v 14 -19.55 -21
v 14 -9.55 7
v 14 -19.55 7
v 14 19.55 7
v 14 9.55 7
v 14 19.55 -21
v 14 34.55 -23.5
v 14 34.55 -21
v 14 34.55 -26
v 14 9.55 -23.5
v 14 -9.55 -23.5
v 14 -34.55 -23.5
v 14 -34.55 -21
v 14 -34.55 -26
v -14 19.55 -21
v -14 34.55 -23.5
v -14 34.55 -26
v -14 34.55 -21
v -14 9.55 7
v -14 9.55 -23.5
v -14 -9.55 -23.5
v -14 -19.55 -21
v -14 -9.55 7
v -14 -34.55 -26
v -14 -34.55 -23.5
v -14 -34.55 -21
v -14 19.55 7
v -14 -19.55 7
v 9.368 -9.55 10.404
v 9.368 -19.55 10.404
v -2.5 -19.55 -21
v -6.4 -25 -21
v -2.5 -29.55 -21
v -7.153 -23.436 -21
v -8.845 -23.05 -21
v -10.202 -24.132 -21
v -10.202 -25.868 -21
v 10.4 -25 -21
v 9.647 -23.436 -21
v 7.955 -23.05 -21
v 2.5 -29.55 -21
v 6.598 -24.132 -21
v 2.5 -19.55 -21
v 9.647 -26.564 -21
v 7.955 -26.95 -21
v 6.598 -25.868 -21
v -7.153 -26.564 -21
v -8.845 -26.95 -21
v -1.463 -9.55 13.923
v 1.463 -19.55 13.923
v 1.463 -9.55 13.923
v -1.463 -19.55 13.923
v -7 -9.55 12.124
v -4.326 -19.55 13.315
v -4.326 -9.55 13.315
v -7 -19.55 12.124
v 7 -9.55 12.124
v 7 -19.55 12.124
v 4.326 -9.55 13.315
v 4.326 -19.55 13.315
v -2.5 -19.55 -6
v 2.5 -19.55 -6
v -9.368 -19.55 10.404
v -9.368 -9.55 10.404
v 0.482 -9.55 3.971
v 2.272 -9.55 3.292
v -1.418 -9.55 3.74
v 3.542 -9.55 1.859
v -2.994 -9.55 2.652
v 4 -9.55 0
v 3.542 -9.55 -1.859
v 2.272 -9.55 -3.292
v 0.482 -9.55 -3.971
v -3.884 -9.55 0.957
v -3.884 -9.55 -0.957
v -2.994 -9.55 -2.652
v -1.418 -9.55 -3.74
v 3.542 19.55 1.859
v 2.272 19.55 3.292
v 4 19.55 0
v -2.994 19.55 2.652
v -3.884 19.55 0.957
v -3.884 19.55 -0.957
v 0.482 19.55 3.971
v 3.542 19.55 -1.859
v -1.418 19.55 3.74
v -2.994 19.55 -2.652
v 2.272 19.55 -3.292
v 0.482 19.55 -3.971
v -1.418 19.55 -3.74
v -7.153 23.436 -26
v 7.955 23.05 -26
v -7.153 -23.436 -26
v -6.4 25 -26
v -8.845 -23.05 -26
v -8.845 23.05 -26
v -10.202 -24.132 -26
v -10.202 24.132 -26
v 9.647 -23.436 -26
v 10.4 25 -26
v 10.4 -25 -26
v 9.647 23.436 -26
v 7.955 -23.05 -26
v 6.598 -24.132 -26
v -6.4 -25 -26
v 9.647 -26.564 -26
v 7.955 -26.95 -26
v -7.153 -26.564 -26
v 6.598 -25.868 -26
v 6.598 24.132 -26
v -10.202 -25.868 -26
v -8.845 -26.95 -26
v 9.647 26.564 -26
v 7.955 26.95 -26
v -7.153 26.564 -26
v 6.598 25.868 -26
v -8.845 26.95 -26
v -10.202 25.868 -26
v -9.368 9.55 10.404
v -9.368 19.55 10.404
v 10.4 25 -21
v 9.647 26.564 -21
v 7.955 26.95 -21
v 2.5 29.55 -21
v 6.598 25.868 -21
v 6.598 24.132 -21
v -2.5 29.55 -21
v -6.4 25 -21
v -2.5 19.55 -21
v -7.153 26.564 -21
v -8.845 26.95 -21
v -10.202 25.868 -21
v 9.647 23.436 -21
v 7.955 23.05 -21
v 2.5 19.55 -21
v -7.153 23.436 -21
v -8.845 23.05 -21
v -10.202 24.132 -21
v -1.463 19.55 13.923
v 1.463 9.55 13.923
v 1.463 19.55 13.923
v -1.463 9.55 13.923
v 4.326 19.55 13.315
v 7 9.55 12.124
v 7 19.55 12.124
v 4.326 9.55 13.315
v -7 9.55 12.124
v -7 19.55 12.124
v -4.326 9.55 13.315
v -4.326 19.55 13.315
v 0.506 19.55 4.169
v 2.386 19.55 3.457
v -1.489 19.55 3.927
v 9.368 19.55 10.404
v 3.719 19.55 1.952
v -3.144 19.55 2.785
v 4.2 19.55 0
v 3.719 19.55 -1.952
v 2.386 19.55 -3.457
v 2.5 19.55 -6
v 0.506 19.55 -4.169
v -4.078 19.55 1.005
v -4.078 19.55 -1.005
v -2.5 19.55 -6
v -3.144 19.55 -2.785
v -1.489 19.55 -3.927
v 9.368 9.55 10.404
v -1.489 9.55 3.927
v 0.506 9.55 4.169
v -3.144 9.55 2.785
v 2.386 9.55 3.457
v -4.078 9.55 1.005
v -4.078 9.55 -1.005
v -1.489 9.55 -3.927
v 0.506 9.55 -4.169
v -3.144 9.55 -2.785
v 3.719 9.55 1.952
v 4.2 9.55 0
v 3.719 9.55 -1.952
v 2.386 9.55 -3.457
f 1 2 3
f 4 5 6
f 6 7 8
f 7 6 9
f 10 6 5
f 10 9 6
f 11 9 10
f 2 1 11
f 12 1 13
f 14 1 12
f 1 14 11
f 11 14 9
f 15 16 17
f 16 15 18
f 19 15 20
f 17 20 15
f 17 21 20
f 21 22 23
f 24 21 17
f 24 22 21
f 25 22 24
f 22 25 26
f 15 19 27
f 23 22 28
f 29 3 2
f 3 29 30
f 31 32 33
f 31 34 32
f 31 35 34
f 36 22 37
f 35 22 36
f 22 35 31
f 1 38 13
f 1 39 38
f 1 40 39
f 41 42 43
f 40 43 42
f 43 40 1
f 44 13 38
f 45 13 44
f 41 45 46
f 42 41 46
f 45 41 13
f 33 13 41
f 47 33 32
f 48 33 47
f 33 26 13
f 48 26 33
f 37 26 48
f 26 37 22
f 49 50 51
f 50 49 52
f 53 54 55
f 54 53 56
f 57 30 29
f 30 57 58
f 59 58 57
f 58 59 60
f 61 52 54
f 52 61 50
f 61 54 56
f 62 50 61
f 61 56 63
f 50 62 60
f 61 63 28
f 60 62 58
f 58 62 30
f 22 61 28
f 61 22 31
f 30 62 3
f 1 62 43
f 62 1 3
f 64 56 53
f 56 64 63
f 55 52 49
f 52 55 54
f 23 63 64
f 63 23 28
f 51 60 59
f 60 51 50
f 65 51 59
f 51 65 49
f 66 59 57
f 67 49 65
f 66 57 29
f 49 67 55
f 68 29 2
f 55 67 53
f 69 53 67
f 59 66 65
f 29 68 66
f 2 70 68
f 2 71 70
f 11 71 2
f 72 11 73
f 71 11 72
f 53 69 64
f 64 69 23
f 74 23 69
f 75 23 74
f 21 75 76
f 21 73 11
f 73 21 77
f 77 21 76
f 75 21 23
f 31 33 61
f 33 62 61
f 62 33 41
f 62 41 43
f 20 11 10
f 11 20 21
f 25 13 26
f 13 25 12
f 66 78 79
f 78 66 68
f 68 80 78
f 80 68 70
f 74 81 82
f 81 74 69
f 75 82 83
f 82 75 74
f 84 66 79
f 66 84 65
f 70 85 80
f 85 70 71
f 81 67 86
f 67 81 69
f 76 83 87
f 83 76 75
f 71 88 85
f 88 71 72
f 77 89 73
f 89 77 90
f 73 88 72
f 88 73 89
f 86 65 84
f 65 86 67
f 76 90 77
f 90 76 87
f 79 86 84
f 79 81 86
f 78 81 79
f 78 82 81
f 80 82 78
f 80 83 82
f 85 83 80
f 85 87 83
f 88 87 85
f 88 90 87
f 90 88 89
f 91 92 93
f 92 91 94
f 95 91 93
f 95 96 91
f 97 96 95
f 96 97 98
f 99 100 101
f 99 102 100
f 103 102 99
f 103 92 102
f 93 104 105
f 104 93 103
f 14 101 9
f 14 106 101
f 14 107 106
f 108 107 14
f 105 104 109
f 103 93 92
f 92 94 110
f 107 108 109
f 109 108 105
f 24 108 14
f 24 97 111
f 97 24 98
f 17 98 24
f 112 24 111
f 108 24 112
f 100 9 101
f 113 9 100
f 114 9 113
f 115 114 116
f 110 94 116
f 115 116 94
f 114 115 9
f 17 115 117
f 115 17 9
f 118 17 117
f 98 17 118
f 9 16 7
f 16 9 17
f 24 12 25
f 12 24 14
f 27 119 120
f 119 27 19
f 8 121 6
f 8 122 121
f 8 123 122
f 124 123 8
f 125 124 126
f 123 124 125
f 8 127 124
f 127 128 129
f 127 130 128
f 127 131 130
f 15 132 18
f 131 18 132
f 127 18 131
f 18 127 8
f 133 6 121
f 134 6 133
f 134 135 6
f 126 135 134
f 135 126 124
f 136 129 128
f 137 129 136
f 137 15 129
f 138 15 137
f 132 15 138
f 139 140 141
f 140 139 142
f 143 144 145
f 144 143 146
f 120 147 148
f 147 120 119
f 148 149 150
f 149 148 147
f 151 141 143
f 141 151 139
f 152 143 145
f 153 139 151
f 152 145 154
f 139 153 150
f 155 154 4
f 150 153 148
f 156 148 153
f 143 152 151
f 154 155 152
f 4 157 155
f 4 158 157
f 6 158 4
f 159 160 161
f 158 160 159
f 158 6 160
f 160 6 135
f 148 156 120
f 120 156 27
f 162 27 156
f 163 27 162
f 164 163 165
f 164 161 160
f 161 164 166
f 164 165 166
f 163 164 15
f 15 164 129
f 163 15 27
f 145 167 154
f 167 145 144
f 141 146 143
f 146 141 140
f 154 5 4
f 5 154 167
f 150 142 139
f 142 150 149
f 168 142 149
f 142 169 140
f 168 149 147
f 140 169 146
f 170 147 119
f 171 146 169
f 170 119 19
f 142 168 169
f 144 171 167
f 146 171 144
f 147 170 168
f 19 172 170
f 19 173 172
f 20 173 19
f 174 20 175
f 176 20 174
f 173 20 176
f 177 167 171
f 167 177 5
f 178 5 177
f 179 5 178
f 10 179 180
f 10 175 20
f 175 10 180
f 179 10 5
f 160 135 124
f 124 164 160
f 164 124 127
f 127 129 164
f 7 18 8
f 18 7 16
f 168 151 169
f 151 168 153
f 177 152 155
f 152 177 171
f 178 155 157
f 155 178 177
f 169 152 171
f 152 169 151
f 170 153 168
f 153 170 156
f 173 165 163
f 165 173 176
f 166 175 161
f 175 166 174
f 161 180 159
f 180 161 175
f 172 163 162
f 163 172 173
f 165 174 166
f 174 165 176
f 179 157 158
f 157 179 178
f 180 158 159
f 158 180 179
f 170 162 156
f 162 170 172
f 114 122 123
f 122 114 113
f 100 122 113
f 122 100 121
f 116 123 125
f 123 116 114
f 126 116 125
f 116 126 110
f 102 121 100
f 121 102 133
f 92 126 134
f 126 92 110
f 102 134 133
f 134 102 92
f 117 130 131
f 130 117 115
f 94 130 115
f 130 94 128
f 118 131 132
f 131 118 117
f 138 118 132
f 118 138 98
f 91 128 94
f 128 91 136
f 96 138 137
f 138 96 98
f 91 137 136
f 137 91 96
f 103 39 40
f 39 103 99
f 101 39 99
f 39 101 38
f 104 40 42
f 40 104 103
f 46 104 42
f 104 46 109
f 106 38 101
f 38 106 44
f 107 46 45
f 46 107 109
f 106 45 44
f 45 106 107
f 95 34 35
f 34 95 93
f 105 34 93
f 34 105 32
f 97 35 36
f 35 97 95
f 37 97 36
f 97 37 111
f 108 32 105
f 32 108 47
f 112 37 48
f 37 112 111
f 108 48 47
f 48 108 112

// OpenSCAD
// file: tensioner_bearing_idler.scad
bearing_r = 11.1;
retainer_h = bearing_r + 6;
wall_thickness = 2;
idler_h = 15;

module idler(){
	difference(){
		union(){
			translate([0,0,idler_h - wall_thickness]) cylinder(h=wall_thickness, r = retainer_h);
			cylinder(h=idler_h, r = bearing_r + wall_thickness);
			cylinder(h=wall_thickness, r = retainer_h);
		}
		cylinder(h=idler_h, r = bearing_r);
	}
}

module inner(){
	difference(){
		cylinder(h=idler_h, r = bearing_r);
		cylinder(h=idler_h, r = 4);
	}
}


module idler_with_inner(){
	rotate([90,0,0]){
		translate([0,0,-0.5 * idler_h]){
			idler();
			color([0.5,0.5,1])
			inner();
		}
	}
}
// main file
include <tensioner_bearing_idler.scad>
bearing_ir = 4;
support_w = 10;
bearing_gap = 1;
rod_l = retainer_h + 2*support_w + 2*bearing_gap;
support_dim = 14;
support_h = 35;
base_h = 2.5;
base_l = 25;
mounting_r = 2;

module rod(){
	color([0.8,0.8,0.8])
	translate([0, 0.5 * rod_l, 0])
	rotate([90,0,0]){
		cylinder(r=bearing_ir, h=rod_l);
	}
}

module base_support(){
	union(){
		translate([0,0.5 * support_w,0]){
			hull(){
				rotate([90,0,0]){
					cylinder(h = support_w, r = support_dim);
				}
				translate([-1 * support_dim, -1 * support_w, -1 * (support_h - support_dim)])
				cube([2*support_dim, support_w, 2*support_dim,]);
			}
		}
		translate([0,5,-1 * (support_h - support_dim)])rotate([0,270,0])triangle(15,10,5);
		translate([-1 * support_dim, -0.5 * support_w, -1 * (support_h - support_dim) - base_h]){
			cube([2*support_dim, base_l, base_h]);
		}
	}
}

module left_support(){
	union(){
		translate([0, (-0.5 * rod_l) - (-0.5 * support_w), 0]){
			rotate([0,0,180])base_support();
		}
		rod();
		translate([-1 * support_dim, (-0.5 * rod_l) - (base_l - support_w), -1 * (support_h - support_dim) - 2*base_h]){
			cube([2*support_dim, (base_l - support_w) * 2 + rod_l, base_h]);
		}
		
	}
}

module right_support(){
	difference(){
		translate([0, (0.5 * rod_l) - (0.5 * support_w), 0]){
			base_support();
		}
		scale([1.05, 1.05, 1.05])rod();
	}
}


module triangle(h,b,w){
	linear_extrude(height = w, center = true, convexity = 10, twist = 0)
	polygon(points=[[0,0],[h,0],[0,b]], paths=[[0,1,2]]);
}

module mounting_holes(){
	color([1,0,0]){
		translate([support_dim * 0.6, base_l, -1 * (support_h - support_dim) - 2.5*base_h]) cylinder(h=base_h * 3, r = mounting_r);
		translate([support_dim * -0.6, base_l, -1 * (support_h - support_dim) - 2.5*base_h]) cylinder(h=base_h * 3, r = mounting_r);
		translate([support_dim * 0.6, -1 * base_l, -1 * (support_h - support_dim) - 2.5*base_h]) cylinder(h=base_h * 3, r = mounting_r);
		translate([support_dim * -0.6, -1 * base_l, -1 * (support_h - support_dim) - 2.5*base_h]) cylinder(h=base_h * 3, r = mounting_r);
	}
}

difference(){
	union(){
		//idler_with_inner();
		left_support();
		right_support();
	}
	mounting_holes();
}
